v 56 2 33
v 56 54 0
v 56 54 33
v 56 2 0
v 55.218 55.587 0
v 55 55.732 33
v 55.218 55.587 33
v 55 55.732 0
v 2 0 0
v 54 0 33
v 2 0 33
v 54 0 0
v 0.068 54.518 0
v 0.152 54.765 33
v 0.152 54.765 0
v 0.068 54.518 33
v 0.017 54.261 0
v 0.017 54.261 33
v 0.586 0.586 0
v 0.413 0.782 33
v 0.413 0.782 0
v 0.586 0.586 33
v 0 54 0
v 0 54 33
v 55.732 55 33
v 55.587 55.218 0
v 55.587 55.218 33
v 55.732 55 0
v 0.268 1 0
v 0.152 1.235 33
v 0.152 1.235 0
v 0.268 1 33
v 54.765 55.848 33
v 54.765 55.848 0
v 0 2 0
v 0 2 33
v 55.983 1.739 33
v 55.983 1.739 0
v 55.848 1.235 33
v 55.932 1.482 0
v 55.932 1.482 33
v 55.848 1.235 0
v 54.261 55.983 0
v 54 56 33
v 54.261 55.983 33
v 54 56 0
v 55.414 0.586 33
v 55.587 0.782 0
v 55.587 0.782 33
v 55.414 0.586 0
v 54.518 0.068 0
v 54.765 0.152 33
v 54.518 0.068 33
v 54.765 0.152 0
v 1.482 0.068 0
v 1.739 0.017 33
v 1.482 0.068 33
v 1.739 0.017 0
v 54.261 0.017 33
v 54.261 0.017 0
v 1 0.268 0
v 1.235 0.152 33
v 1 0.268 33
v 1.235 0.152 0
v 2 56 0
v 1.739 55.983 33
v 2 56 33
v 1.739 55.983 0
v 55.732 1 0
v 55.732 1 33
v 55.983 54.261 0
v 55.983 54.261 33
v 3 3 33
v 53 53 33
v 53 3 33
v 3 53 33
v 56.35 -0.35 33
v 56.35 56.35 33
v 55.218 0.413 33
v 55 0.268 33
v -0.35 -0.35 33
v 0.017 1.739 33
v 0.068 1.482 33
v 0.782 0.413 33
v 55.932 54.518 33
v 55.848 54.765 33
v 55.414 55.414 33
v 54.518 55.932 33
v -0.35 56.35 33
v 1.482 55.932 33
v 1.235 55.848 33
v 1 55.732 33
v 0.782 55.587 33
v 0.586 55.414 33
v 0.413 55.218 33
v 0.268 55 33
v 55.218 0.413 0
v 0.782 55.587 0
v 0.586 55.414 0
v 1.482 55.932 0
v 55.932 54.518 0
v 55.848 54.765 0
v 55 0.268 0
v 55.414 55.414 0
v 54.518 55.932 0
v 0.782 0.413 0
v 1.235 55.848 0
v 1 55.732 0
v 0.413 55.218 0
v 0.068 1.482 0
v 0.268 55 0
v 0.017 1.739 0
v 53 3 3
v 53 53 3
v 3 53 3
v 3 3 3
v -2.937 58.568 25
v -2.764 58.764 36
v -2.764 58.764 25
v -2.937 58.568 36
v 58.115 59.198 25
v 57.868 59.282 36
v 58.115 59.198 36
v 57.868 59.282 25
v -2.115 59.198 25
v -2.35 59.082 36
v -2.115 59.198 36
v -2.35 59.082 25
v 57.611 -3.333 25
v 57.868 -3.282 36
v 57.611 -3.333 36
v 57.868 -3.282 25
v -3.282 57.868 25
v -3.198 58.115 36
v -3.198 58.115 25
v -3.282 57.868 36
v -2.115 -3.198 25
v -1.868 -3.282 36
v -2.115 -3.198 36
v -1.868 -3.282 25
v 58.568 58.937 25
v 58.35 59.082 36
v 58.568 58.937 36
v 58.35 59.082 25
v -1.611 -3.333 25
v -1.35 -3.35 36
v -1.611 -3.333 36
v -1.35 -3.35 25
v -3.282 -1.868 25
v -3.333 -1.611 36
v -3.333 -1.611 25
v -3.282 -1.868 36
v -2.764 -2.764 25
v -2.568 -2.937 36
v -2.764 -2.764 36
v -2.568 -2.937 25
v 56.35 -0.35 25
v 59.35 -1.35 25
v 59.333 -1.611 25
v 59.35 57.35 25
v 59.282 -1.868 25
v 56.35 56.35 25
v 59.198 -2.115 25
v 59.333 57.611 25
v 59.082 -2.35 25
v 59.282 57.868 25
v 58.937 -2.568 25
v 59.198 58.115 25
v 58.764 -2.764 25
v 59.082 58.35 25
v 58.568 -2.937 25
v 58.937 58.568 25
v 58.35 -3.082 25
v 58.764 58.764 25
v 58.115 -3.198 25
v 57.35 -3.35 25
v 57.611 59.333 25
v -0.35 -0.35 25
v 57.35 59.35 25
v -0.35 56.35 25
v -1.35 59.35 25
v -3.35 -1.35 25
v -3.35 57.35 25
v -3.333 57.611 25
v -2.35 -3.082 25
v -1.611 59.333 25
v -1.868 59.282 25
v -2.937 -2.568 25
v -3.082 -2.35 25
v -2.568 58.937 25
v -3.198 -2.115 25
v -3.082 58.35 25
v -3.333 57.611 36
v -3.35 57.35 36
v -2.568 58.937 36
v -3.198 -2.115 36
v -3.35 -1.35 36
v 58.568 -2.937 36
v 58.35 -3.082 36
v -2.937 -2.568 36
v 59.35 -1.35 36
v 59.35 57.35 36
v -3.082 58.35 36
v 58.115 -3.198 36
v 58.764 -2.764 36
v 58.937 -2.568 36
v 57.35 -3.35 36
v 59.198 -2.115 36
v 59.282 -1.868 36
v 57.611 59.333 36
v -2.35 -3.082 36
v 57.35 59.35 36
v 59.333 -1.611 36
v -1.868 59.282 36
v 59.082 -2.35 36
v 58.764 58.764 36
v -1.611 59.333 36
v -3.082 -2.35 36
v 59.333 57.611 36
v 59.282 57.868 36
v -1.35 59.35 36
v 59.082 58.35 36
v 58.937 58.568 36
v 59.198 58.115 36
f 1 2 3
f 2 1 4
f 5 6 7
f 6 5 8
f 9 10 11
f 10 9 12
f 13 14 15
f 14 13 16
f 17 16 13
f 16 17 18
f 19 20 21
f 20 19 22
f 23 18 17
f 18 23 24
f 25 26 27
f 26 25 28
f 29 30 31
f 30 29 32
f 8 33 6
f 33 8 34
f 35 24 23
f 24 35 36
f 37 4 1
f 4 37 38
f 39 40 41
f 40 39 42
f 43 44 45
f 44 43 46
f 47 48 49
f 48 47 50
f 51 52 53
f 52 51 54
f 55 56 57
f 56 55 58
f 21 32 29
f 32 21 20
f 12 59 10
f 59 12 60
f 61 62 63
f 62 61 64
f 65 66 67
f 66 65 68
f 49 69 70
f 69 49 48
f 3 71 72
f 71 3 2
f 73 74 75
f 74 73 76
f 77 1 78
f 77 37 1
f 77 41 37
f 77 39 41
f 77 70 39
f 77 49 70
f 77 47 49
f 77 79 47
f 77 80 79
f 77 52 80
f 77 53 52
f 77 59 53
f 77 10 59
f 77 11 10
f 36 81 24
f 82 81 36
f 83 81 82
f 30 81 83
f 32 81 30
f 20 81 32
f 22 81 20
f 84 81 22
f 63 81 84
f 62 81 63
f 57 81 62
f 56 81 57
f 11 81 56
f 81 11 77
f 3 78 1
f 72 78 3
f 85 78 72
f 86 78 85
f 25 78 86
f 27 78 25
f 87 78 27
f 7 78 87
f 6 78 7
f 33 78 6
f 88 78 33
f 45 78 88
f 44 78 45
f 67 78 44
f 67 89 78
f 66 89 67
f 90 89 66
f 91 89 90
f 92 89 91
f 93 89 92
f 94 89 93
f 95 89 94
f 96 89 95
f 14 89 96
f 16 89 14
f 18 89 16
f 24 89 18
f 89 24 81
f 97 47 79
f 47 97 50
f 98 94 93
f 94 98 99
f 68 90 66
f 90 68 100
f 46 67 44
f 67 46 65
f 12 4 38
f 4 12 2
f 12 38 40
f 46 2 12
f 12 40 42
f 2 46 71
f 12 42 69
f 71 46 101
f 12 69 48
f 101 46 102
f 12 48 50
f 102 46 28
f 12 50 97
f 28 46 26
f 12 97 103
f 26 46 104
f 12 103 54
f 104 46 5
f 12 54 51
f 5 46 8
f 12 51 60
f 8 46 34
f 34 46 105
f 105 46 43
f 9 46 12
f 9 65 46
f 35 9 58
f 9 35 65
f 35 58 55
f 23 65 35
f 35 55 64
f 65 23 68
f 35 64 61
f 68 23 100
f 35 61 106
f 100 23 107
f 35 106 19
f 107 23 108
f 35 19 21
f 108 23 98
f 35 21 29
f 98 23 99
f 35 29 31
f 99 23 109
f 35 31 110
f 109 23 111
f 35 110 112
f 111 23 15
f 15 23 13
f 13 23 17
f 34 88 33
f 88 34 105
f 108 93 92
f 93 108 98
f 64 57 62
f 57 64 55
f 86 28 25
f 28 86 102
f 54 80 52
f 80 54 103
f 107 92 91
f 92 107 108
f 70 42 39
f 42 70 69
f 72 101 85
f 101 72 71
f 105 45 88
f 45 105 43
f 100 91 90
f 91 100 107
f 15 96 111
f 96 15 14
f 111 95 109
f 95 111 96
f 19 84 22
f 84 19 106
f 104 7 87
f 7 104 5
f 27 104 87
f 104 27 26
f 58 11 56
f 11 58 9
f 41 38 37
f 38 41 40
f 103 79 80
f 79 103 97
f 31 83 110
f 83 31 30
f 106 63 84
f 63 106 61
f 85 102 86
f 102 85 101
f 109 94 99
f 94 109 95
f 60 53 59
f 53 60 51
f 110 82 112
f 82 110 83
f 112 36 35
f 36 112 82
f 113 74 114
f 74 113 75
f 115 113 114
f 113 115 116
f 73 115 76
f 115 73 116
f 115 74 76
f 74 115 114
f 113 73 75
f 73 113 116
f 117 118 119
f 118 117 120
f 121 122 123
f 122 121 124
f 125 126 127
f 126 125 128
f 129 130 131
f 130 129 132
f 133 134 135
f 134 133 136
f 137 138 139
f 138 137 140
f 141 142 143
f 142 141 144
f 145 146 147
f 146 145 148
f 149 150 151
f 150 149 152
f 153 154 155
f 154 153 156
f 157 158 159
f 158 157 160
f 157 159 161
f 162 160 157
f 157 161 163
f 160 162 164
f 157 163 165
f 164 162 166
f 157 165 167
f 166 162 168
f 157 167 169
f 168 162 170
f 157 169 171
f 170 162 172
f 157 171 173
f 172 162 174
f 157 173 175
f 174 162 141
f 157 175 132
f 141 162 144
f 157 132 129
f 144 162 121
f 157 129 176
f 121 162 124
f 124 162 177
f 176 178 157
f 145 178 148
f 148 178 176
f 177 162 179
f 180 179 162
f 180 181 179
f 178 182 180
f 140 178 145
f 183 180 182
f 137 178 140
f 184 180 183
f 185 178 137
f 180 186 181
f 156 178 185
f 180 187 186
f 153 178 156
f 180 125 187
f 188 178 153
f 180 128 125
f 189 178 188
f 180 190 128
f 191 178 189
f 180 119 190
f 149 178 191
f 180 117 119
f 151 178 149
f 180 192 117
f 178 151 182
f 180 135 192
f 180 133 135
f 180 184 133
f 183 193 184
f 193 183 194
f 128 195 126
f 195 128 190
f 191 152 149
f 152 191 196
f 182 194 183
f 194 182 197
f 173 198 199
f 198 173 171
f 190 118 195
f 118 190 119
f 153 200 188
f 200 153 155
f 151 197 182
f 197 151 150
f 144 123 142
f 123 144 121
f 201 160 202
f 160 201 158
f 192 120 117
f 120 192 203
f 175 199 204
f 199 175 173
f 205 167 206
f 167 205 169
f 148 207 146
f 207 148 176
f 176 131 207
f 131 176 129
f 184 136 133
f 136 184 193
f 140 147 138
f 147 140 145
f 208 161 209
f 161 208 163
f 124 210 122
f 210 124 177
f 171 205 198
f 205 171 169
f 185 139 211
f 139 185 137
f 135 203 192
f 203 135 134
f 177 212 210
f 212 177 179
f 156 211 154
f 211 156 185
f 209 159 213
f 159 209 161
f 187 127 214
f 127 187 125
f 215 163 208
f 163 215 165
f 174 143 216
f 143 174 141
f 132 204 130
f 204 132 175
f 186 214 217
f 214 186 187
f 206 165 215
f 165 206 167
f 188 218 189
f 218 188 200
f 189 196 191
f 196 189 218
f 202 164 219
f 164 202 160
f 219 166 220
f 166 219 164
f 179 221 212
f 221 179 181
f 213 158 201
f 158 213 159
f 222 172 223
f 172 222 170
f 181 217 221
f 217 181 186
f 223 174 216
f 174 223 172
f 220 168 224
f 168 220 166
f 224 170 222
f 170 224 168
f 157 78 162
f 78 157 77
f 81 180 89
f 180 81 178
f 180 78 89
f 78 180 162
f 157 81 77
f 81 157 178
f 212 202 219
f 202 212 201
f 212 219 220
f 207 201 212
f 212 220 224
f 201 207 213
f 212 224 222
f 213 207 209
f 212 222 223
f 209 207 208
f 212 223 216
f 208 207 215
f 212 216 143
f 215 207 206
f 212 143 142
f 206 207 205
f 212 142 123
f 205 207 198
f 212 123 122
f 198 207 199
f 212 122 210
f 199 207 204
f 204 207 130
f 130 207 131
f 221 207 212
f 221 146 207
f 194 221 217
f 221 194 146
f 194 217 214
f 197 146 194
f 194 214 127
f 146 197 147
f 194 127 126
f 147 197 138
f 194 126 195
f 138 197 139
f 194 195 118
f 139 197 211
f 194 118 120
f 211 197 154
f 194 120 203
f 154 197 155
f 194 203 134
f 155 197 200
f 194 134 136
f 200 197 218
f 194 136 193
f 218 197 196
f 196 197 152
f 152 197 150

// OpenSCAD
$fn = 48;

wall = 3.0;
clearance = 0.35;

cavity_x = 50;
cavity_y = 50;
cavity_z = 30;

base_outer_x = cavity_x + 2 * wall;
base_outer_y = cavity_y + 2 * wall;
base_outer_z = cavity_z + wall;

lid_top_thickness = wall;
lid_skirt_wall = wall;
lid_skirt_depth = 8;

lid_inner_x = base_outer_x + 2 * clearance;
lid_inner_y = base_outer_y + 2 * clearance;
lid_outer_x = lid_inner_x + 2 * lid_skirt_wall;
lid_outer_y = lid_inner_y + 2 * lid_skirt_wall;

module rounded_box(size, r) {
    x = size[0];
    y = size[1];
    z = size[2];

    hull() {
        translate([r, r, 0]) cylinder(h = z, r = r);
        translate([x - r, r, 0]) cylinder(h = z, r = r);
        translate([r, y - r, 0]) cylinder(h = z, r = r);
        translate([x - r, y - r, 0]) cylinder(h = z, r = r);
    }
}

module base() {
    difference() {
        rounded_box([base_outer_x, base_outer_y, base_outer_z], 2);
        translate([wall, wall, wall])
            cube([cavity_x, cavity_y, cavity_z + 0.2]);
    }
}

module lid() {
    translate([
        (base_outer_x - lid_outer_x) / 2,
        (base_outer_y - lid_outer_y) / 2,
        base_outer_z - lid_skirt_depth
    ])
    difference() {
        union() {
            translate([0, 0, lid_skirt_depth])
                rounded_box([lid_outer_x, lid_outer_y, lid_top_thickness], 2);
            difference() {
                rounded_box([lid_outer_x, lid_outer_y, lid_skirt_depth], 2);
                translate([lid_skirt_wall, lid_skirt_wall, -0.1])
                    cube([lid_inner_x, lid_inner_y, lid_skirt_depth + 0.2]);
            }
        }

        translate([lid_skirt_wall, lid_skirt_wall, -0.1])
            cube([lid_inner_x, lid_inner_y, lid_skirt_depth + 0.1]);
    }
}

base();
lid();
